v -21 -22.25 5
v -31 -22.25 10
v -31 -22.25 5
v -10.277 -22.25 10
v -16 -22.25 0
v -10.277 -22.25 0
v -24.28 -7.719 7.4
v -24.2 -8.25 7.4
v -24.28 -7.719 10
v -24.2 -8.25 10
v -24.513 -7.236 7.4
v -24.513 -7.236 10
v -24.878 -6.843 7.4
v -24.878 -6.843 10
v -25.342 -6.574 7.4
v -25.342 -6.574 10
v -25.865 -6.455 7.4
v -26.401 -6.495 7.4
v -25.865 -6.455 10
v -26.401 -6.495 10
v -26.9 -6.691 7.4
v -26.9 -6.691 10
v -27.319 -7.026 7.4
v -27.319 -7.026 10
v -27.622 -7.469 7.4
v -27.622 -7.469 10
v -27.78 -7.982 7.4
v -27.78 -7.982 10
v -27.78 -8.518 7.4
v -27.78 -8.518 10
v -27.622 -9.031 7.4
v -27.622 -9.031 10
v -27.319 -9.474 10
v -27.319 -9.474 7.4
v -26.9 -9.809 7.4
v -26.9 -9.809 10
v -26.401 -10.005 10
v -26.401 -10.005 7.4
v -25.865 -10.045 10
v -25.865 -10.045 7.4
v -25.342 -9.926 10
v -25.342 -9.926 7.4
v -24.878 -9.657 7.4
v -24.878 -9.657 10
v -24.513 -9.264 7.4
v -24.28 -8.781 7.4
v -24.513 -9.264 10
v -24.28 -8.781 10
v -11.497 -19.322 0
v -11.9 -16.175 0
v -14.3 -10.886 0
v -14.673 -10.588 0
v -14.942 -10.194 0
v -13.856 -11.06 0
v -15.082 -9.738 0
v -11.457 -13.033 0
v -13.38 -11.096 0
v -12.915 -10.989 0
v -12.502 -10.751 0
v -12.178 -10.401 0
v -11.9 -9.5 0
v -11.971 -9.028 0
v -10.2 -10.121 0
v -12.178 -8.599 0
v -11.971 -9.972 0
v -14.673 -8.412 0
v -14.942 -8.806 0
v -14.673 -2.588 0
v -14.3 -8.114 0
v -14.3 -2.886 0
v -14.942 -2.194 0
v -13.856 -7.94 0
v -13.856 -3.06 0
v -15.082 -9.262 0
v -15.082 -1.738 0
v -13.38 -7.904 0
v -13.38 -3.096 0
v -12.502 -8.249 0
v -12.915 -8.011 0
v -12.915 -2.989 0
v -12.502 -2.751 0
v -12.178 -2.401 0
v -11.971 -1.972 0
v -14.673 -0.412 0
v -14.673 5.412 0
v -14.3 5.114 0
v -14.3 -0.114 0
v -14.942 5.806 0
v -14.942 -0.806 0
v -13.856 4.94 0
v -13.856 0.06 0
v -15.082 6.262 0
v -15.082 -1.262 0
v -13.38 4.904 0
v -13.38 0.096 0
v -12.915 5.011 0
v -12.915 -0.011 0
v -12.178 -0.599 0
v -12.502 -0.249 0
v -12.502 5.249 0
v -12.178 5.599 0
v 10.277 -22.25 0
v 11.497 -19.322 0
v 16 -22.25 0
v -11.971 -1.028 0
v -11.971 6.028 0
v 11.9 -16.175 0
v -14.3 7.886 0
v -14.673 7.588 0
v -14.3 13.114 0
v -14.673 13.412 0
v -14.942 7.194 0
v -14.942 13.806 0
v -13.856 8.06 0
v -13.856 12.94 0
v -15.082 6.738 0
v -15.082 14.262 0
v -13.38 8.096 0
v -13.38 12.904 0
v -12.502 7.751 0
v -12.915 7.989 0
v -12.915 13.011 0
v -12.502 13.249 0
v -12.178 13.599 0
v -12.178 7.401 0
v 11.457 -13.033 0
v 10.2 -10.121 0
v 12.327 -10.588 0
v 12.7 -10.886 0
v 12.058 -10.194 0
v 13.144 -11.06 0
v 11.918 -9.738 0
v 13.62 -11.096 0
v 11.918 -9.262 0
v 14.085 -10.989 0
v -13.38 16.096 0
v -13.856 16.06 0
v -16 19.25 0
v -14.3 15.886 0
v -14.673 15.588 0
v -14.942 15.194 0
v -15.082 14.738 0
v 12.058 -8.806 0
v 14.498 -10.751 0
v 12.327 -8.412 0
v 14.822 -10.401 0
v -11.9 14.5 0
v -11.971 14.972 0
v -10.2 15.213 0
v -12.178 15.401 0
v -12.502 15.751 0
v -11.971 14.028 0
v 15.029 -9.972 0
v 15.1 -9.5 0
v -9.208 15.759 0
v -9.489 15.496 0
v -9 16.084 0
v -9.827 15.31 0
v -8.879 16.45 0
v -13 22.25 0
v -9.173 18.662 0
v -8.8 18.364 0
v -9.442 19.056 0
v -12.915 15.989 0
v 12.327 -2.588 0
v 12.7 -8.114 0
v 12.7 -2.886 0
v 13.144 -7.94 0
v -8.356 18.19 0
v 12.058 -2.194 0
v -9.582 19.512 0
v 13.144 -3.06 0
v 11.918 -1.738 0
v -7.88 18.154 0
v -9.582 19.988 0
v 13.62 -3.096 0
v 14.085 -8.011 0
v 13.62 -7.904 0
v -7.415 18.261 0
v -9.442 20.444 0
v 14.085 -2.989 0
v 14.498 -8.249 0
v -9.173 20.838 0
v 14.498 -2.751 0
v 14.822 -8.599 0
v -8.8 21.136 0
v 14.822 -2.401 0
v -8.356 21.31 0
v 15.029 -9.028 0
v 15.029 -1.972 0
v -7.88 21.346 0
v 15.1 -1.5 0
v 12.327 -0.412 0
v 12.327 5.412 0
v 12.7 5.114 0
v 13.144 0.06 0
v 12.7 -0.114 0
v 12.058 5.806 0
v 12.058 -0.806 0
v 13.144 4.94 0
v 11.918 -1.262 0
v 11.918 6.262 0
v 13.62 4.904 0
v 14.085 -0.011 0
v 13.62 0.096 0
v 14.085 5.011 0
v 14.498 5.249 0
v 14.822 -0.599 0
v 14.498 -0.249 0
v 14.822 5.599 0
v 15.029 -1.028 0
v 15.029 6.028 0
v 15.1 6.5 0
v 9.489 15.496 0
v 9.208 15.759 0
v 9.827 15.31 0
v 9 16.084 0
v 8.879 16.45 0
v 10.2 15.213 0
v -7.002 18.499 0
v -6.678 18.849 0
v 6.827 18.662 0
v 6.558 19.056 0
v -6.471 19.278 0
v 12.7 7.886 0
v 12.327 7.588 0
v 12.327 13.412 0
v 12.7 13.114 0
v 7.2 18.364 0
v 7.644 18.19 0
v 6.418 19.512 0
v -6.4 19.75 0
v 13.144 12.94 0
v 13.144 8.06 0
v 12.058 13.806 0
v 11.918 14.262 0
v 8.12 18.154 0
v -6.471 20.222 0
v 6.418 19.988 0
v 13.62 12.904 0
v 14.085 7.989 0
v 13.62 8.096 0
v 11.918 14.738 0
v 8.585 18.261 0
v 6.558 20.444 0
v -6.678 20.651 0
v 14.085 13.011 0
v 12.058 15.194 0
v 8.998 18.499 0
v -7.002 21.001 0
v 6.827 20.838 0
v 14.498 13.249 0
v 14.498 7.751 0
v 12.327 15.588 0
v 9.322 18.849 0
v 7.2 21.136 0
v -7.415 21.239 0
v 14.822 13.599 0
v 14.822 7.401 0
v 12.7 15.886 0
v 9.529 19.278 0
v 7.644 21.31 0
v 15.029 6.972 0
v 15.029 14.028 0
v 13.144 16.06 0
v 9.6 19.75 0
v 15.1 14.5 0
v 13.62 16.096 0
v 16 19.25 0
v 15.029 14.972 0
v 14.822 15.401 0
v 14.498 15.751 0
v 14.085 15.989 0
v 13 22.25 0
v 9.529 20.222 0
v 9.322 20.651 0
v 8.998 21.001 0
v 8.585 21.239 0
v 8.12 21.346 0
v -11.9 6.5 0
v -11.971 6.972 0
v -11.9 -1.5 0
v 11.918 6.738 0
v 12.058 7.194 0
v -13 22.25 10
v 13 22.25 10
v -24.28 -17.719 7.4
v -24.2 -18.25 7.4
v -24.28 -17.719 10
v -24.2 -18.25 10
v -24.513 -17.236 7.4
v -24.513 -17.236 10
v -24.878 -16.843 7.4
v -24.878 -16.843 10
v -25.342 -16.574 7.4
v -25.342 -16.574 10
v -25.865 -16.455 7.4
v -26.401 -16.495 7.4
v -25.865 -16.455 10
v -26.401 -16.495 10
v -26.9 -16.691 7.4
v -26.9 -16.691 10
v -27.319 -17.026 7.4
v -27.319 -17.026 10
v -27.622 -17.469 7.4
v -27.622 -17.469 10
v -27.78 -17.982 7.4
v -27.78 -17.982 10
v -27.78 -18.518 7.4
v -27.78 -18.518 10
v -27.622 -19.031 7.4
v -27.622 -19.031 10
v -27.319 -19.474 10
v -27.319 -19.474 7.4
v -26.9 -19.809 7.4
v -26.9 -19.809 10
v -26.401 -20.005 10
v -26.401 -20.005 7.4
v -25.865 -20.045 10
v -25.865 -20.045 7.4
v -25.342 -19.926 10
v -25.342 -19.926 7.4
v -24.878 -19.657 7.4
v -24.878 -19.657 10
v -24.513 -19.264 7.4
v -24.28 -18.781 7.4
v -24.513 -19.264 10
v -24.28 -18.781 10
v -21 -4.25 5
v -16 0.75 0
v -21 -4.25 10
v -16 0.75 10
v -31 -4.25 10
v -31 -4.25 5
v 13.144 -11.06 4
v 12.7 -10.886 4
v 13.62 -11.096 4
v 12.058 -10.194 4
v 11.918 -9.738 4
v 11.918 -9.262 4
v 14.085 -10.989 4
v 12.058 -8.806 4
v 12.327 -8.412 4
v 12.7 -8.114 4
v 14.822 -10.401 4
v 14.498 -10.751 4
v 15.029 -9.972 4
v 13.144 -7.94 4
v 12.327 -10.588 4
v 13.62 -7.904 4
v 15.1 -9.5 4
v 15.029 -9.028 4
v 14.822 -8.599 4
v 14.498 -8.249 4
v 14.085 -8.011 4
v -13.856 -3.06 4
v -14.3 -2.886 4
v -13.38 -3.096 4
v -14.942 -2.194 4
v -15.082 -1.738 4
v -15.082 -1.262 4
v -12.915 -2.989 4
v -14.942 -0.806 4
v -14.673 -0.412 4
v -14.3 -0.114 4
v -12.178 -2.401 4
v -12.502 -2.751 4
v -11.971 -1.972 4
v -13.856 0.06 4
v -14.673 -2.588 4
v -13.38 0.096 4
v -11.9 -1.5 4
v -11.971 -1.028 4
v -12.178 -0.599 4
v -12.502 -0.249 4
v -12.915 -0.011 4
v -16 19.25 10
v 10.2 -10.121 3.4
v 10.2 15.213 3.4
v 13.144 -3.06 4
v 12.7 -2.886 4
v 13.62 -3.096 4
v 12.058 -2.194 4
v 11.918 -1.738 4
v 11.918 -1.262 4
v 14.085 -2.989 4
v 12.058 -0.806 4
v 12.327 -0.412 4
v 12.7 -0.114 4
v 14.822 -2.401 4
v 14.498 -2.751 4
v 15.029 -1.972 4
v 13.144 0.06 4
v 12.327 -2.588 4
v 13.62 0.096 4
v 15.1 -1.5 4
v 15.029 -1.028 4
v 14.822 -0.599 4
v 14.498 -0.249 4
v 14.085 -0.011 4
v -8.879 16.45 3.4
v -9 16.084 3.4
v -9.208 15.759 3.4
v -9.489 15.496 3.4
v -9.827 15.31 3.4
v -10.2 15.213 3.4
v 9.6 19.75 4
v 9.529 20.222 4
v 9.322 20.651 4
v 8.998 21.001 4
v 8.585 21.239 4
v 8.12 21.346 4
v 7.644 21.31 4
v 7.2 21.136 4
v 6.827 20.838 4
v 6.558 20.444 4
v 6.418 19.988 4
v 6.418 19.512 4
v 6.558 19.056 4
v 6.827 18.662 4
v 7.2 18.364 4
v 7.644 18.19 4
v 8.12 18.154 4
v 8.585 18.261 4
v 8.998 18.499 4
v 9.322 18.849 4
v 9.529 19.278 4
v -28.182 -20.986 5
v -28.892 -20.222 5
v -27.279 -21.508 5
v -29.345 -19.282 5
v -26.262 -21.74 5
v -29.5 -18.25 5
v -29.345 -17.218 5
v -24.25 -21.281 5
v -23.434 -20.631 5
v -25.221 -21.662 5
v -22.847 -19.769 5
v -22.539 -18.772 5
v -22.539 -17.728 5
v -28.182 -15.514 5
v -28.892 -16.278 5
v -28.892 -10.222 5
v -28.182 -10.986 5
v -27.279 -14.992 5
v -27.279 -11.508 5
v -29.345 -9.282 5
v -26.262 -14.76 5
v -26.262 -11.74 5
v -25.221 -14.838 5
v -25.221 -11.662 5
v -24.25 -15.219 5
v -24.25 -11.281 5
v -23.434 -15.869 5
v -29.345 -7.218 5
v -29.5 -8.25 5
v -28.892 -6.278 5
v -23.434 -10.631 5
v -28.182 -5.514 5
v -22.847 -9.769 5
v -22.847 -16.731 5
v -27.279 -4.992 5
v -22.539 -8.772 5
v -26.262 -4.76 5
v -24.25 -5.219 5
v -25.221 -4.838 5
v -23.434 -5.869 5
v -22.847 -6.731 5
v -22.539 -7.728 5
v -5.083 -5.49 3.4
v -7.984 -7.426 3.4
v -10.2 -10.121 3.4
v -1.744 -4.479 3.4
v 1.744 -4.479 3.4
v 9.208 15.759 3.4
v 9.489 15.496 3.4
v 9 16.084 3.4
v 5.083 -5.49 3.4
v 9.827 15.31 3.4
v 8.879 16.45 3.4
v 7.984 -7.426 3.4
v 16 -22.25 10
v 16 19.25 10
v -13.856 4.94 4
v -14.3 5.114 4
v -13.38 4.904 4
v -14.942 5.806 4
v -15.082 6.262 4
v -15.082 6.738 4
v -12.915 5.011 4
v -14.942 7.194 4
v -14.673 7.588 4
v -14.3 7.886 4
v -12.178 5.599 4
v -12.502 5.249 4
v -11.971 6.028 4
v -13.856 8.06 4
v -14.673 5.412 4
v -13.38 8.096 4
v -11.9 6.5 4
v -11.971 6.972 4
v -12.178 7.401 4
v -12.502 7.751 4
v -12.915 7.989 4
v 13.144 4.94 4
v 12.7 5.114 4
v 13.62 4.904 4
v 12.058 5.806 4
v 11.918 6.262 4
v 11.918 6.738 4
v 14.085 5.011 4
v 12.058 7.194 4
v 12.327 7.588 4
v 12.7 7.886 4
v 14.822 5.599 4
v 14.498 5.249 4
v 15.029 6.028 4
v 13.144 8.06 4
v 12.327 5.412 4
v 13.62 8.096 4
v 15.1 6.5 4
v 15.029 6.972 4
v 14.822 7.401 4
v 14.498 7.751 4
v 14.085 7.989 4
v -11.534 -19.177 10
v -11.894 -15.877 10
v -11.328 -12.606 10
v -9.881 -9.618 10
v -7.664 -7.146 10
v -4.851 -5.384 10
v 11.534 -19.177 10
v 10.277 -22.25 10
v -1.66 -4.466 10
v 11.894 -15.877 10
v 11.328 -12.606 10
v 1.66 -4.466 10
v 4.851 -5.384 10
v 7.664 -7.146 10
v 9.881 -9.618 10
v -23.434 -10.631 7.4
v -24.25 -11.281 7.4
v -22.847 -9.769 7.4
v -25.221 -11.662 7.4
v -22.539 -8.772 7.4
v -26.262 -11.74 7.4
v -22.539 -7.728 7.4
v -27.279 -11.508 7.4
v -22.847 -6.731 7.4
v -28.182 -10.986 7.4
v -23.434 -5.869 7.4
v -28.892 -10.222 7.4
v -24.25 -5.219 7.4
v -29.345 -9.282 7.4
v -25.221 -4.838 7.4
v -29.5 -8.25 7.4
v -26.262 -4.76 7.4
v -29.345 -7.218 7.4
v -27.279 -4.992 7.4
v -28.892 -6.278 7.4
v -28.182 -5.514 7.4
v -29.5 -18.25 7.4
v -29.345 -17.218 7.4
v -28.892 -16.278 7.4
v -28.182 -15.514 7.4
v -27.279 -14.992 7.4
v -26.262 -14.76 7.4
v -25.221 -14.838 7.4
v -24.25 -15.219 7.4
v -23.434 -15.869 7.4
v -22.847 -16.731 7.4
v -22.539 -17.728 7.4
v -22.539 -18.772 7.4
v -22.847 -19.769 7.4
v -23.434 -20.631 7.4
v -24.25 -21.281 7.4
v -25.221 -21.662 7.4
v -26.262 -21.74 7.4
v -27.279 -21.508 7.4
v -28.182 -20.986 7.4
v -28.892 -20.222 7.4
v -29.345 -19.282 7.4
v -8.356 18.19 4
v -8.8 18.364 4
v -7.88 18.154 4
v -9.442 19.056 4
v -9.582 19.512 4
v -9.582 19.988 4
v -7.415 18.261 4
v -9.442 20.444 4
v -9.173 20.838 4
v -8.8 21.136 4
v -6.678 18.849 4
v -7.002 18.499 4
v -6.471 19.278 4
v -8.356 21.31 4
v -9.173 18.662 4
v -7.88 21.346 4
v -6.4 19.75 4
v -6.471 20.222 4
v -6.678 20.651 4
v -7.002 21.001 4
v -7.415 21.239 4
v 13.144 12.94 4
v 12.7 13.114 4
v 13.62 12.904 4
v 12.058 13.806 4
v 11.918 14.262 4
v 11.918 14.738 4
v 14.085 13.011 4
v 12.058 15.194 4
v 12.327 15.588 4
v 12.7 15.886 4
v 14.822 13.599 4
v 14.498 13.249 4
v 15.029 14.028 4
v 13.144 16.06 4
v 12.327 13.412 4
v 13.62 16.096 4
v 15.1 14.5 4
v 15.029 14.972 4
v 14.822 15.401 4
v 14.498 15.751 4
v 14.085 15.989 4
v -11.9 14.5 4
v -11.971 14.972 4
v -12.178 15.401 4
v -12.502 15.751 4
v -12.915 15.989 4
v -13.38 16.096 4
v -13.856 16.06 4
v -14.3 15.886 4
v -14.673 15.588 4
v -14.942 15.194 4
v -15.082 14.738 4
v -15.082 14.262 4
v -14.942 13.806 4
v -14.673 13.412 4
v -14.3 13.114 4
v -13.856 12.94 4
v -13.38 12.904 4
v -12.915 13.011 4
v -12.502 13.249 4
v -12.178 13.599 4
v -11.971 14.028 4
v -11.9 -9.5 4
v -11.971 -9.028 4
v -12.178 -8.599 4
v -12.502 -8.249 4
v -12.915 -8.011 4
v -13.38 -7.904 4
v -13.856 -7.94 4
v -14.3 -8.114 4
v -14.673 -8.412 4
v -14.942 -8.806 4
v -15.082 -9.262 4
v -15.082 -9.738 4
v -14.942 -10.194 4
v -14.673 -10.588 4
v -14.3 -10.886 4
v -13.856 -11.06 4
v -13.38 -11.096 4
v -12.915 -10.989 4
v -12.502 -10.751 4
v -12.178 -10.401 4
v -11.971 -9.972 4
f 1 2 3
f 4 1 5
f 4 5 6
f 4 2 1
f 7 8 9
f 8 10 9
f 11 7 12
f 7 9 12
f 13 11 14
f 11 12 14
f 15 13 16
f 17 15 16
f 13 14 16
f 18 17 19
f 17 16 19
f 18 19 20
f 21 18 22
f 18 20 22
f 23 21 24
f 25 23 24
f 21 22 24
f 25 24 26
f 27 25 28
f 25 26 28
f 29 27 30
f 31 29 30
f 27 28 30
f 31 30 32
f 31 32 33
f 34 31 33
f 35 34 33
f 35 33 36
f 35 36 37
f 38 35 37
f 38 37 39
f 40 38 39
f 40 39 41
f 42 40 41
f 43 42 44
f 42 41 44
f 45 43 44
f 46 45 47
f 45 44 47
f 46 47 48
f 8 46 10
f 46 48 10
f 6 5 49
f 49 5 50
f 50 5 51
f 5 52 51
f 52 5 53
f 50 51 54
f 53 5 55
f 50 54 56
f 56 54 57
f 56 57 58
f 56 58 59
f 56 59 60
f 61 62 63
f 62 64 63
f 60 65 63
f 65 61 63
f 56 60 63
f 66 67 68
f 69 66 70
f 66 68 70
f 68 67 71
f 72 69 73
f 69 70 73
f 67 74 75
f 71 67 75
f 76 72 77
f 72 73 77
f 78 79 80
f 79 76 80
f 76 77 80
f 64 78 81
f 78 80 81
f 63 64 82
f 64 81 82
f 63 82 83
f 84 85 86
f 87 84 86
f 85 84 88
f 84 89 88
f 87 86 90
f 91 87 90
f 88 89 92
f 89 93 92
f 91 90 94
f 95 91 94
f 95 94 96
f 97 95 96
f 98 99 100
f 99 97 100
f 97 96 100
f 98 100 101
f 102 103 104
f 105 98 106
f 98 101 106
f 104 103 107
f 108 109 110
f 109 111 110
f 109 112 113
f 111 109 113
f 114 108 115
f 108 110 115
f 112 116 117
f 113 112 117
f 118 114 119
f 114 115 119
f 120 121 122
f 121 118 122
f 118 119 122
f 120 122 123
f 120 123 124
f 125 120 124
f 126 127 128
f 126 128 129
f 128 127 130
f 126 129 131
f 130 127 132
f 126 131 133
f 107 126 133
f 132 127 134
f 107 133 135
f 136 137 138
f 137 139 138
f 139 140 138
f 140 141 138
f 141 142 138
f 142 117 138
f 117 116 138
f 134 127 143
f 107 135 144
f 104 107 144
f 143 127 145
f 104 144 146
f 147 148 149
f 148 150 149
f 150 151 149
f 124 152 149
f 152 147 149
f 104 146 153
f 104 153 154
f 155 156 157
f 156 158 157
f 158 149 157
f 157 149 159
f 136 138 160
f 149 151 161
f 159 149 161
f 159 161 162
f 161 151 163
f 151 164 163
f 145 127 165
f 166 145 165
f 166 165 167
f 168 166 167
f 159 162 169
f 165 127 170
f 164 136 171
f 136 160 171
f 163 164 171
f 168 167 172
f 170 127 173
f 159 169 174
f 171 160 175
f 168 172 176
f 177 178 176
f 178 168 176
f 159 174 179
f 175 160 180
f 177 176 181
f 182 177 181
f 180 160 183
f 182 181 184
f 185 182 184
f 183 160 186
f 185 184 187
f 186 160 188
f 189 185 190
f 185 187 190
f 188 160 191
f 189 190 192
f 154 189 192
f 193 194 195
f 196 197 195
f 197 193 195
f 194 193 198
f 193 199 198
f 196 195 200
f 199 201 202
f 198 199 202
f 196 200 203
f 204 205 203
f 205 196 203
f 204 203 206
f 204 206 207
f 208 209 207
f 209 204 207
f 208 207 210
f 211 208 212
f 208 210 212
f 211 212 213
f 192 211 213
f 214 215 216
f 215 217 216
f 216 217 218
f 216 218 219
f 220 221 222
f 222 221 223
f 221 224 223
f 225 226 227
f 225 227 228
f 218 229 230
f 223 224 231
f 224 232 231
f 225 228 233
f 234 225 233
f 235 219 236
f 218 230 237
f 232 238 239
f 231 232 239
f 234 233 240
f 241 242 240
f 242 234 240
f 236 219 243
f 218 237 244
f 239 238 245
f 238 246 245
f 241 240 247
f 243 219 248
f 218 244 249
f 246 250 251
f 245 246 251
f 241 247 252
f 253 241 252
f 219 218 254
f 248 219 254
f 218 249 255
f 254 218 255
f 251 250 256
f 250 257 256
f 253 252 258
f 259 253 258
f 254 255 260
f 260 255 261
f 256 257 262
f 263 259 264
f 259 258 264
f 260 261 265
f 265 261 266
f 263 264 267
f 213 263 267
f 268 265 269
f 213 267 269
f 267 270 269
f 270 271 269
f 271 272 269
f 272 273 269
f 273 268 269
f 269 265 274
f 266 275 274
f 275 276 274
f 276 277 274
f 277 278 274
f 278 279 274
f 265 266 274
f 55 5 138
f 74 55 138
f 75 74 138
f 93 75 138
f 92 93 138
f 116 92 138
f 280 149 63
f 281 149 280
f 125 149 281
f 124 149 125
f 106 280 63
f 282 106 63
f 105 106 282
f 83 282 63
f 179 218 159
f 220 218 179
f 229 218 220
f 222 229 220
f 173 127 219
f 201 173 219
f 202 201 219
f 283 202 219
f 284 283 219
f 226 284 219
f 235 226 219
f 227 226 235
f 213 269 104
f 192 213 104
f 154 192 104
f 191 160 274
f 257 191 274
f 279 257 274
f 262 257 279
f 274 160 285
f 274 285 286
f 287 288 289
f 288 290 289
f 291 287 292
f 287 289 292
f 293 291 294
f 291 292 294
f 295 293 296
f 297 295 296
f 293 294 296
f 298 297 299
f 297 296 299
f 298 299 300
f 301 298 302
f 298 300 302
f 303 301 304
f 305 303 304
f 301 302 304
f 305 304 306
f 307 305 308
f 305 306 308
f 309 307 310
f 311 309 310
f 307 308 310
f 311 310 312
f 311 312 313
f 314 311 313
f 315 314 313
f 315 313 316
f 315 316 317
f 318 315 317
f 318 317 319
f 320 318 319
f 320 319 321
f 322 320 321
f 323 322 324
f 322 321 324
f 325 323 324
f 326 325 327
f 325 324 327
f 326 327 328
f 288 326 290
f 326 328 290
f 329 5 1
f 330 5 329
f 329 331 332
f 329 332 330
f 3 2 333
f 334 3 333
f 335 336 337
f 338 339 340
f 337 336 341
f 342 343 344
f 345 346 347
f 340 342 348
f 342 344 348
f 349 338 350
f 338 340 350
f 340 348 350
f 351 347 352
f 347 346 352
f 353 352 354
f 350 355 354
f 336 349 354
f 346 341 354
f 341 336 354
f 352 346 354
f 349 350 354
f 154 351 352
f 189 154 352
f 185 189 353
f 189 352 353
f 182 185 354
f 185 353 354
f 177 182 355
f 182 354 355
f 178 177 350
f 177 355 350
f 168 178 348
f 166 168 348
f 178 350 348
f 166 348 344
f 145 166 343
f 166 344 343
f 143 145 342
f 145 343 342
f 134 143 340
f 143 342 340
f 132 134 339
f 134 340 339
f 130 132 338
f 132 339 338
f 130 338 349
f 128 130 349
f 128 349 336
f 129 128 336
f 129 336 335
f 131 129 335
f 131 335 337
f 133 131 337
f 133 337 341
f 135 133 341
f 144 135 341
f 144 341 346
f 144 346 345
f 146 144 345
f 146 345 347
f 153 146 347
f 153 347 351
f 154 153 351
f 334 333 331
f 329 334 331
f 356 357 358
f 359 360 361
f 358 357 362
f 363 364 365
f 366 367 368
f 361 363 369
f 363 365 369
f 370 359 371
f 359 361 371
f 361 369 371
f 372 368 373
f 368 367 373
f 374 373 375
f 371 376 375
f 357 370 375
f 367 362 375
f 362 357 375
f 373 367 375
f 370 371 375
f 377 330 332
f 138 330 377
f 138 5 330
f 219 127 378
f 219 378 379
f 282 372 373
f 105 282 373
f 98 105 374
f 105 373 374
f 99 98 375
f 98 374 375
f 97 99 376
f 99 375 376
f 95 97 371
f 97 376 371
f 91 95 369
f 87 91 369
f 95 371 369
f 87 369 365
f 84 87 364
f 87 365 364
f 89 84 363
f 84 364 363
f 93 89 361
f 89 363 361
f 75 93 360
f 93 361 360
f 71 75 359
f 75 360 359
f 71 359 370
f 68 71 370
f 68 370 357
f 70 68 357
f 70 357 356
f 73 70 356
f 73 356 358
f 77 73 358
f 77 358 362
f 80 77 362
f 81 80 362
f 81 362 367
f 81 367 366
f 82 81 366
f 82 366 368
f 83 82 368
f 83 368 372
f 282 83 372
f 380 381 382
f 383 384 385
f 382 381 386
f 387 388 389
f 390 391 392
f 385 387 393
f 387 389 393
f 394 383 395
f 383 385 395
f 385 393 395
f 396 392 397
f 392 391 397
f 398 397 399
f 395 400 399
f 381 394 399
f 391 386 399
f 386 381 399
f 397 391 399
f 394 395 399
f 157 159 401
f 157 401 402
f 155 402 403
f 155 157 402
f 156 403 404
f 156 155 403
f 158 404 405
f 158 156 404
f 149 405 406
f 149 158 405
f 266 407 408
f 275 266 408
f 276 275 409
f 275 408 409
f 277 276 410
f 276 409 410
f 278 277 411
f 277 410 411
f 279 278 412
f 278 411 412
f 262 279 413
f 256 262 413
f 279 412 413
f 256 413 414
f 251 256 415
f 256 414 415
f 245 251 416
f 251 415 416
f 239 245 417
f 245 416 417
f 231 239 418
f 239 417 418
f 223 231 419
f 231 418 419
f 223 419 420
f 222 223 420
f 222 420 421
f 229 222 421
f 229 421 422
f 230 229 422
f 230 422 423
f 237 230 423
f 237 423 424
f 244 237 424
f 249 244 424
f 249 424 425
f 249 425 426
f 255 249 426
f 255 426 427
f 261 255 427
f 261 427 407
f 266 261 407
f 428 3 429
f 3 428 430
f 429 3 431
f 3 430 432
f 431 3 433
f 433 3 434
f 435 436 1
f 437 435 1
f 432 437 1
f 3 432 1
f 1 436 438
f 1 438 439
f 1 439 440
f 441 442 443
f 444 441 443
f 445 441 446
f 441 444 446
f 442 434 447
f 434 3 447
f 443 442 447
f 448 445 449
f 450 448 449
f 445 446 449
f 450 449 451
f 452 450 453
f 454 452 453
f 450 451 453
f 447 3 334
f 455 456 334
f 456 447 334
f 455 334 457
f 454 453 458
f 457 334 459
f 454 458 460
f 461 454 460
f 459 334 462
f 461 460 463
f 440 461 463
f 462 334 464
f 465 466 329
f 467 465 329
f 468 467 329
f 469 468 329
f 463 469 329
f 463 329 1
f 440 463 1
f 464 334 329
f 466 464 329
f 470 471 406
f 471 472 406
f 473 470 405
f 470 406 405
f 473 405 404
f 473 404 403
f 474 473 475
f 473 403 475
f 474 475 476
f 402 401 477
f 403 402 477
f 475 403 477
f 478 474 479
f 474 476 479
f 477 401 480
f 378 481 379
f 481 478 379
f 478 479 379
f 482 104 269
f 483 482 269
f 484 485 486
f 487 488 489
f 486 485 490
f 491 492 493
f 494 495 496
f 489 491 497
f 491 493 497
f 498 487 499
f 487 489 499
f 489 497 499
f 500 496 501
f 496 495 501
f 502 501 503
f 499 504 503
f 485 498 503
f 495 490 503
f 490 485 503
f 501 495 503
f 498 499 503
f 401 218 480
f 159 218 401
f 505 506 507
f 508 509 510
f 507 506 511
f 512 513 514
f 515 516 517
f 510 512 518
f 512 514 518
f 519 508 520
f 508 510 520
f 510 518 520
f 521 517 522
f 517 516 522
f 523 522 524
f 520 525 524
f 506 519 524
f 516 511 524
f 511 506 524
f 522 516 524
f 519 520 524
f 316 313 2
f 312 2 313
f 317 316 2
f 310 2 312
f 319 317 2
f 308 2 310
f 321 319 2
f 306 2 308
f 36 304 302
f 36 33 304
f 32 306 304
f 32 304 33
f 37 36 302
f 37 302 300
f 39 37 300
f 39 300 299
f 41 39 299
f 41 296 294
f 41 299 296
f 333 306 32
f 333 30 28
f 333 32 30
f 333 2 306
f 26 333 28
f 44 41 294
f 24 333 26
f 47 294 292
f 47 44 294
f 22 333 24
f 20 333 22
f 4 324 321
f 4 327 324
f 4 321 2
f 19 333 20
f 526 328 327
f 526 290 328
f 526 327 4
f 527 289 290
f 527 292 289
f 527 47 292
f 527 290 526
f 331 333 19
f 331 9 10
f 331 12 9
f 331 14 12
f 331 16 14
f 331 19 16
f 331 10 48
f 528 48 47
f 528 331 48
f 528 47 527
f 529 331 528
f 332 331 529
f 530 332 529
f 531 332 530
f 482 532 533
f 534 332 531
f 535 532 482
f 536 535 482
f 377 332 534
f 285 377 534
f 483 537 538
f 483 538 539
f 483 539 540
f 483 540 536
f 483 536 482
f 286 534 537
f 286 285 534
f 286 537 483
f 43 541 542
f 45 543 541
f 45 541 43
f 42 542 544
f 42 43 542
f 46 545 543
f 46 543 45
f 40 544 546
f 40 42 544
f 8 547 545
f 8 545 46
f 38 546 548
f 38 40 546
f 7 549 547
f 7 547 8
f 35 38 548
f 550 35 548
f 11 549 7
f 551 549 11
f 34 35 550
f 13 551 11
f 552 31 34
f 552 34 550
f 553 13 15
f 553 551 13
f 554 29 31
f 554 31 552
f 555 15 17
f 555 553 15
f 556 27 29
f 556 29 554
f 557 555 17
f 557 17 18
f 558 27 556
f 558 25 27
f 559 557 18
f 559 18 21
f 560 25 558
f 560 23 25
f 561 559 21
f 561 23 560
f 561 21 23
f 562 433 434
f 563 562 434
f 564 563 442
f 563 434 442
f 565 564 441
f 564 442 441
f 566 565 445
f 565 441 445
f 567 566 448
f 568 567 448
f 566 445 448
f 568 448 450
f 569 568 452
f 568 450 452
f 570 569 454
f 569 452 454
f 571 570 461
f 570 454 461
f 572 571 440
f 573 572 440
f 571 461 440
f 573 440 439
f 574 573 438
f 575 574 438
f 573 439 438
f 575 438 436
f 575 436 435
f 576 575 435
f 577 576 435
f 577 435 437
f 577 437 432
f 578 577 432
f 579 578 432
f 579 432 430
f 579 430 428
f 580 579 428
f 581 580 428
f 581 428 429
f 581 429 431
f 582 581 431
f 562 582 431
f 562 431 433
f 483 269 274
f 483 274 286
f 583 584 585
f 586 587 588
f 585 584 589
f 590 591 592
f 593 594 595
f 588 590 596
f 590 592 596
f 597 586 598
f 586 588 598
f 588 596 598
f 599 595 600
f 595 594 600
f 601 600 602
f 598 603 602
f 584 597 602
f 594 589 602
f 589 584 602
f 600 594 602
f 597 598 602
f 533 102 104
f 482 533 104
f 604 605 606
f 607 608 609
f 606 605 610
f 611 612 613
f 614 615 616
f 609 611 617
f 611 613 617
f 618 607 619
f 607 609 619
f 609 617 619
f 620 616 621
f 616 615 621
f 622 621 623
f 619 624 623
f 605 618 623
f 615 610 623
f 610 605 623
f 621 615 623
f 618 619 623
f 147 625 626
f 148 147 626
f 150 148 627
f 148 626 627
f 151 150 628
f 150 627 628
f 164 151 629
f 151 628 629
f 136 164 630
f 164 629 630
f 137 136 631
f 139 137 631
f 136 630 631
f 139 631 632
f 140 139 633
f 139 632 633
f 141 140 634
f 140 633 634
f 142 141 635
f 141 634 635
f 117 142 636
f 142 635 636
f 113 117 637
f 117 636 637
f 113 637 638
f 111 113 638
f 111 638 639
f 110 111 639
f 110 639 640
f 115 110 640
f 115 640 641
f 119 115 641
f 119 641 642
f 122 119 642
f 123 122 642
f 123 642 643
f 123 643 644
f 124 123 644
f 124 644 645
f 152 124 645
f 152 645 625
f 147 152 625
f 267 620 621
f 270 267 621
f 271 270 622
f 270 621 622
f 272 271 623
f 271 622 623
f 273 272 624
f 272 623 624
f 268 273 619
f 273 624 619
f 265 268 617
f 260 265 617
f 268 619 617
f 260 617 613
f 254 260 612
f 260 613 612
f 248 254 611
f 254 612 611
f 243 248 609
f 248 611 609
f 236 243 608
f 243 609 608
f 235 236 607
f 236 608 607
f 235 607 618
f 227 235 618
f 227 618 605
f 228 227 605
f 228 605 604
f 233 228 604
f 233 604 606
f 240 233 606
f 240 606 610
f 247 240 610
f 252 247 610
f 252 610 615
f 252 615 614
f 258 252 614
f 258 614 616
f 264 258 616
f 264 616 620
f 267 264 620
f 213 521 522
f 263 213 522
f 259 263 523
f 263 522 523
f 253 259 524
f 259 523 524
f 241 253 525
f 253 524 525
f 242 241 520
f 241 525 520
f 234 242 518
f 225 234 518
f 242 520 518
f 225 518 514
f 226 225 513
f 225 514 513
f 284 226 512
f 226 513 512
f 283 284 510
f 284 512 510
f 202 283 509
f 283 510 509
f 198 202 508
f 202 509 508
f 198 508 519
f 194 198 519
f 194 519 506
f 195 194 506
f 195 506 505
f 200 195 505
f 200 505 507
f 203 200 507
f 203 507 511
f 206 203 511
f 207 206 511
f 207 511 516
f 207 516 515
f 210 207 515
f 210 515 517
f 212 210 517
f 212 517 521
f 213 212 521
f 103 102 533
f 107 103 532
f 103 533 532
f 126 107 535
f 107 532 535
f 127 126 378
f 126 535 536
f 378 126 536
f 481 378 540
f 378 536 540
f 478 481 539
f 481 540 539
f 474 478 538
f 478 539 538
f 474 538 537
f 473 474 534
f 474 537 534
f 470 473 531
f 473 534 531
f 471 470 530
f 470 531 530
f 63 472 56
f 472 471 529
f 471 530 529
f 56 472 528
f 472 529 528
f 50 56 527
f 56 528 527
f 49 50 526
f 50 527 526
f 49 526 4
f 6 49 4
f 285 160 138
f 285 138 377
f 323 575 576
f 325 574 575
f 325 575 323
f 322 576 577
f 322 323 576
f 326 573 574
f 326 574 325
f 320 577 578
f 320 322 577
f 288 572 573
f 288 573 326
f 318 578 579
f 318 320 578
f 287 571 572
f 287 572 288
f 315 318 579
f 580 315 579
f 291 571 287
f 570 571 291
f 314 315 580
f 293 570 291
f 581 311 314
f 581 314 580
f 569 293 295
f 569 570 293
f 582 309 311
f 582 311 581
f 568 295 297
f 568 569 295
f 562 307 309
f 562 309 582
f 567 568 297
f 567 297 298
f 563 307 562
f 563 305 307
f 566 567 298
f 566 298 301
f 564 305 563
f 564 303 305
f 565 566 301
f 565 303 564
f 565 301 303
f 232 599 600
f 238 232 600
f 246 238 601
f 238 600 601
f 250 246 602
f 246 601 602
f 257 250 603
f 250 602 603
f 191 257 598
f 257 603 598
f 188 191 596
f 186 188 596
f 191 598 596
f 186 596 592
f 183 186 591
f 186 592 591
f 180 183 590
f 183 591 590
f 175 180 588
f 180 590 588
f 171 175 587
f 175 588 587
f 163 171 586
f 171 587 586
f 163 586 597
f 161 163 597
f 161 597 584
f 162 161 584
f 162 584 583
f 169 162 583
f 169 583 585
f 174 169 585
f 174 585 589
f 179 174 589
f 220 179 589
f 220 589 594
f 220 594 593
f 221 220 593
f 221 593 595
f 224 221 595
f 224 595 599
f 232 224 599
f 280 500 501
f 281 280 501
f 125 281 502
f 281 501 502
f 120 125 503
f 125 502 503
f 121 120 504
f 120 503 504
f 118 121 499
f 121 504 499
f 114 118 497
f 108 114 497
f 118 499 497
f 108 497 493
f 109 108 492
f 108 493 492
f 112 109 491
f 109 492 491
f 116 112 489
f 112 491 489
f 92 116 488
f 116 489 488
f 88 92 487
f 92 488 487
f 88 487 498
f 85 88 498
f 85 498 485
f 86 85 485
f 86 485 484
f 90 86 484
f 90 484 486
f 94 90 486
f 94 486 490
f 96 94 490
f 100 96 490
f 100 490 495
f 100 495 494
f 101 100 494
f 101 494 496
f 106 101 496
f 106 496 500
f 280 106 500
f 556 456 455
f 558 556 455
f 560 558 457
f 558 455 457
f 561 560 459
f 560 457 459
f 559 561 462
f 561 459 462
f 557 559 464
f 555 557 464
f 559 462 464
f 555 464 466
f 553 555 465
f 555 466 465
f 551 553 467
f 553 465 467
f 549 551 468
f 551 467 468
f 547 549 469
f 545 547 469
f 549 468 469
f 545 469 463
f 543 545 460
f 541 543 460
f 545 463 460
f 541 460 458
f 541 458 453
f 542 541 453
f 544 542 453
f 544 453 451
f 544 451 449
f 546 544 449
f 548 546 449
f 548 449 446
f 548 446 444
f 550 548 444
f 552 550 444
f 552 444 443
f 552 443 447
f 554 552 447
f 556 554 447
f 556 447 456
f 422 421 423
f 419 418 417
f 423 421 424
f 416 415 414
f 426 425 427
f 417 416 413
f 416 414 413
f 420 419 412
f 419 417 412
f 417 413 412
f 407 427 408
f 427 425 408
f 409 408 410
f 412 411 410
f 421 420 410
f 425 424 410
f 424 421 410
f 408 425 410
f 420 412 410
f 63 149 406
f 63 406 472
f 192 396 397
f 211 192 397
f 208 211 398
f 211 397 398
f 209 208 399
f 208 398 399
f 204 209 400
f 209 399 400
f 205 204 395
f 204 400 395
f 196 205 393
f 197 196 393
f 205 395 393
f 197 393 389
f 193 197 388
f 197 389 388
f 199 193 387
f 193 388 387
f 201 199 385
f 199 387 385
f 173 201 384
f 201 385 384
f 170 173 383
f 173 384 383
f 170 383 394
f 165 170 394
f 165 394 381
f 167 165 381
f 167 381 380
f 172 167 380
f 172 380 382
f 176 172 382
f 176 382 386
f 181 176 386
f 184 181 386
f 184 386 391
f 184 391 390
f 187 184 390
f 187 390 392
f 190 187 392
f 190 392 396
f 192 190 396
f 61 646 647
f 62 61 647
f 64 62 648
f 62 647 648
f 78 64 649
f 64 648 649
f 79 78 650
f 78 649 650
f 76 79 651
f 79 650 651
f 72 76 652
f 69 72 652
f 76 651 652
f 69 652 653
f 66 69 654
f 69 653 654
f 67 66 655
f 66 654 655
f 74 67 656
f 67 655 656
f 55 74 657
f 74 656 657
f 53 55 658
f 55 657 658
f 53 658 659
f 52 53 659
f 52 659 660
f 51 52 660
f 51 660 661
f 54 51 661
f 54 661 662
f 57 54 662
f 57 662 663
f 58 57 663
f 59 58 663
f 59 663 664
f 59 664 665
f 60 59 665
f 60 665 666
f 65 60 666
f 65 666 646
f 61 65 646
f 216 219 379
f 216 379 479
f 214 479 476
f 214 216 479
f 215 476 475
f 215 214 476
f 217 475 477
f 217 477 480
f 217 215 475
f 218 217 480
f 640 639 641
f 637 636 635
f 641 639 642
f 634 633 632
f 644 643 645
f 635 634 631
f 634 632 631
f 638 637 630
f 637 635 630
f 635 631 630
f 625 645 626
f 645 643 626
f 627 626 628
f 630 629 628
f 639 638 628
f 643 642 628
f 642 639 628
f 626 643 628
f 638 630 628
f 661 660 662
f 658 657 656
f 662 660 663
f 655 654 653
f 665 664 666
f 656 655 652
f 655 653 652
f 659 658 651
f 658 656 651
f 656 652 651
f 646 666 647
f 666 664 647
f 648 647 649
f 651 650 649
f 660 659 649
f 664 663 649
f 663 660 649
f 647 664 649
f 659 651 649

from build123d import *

# Parameters (mm, degrees)
SZKIC1_W                                          = 32
SZKIC1_H                                          = 44.5
DODANIE_WYCI_GNI_CIE1_DEPTH                       = 10
WYTNIJ_WYCI_GNI_CIE1_REACH                        = 31.173
SZKIC2_R                                          = 11.9
WYTNIJ_WYCI_GNI_CIE2_DEPTH                        = 3.4
OTW_R_3_2_3_2_1_D                                 = 3.2
OTW_R_3_2_3_2_1_DEPTH                             = 4
SZKIC7_W                                          = 15
SZKIC7_H                                          = 18
DODANIE_WYCI_GNI_CIE2_DEPTH                       = 5
SFAZOWANIE1_SIZE                                  = 5
SFAZOWANIE2_SIZE                                  = 3
POG_BIENIE_WALCOWE_POD_M3_RUB_Z_BEM_S_D           = 3.6
POG_BIENIE_WALCOWE_POD_M3_RUB_Z_BEM_S_DEPTH       = 24
POG_BIENIE_WALCOWE_POD_M3_RUB_Z_BEM_S_CBORE_D     = 7
POG_BIENIE_WALCOWE_POD_M3_RUB_Z_BEM_S_CBORE_DEPTH = 2.4
POG_BIENIE_WALCOWE_POD_M3_RUB_Z_BEM_S_TIP         = 1.081549114


with BuildPart() as part:
    # Szkic1 → Dodanie-wyciągnięcie1 (new body)
    with BuildSketch(Plane.XY):
        Rectangle(SZKIC1_W, SZKIC1_H)
    extrude(amount=DODANIE_WYCI_GNI_CIE1_DEPTH)

    # Szkic2 → Wytnij-wyciągnięcie1 (cut, up to next)
    with BuildSketch(Plane.XY.offset(10), mode=Mode.PRIVATE) as wytnij_wyci_gni_cie1_sk1:
        with Locations((0, -16.25)):
            Circle(SZKIC2_R)
    wytnij_wyci_gni_cie1_tool1 = extrude(wytnij_wyci_gni_cie1_sk1.sketch, amount=-WYTNIJ_WYCI_GNI_CIE1_REACH, mode=Mode.PRIVATE) & part.part
    add(wytnij_wyci_gni_cie1_tool1.solids().sort_by_distance((0, -16.25, 10))[0], mode=Mode.SUBTRACT)

    # Szkic3 → Wytnij-wyciągnięcie2 (cut)
    with BuildSketch(Plane.XY):
        with BuildLine():
            Line((10.2, -7.3), (10.2, 15.212957385))
            ThreePointArc((10.2, 15.212957385), (9.34039504, 15.618745241), (8.879309367, 16.45))
            Line((8.879309367, 16.45), (-8.879309367, 16.45))
            ThreePointArc((-8.879309367, 16.45), (-9.34039504, 15.618745241), (-10.2, 15.212957385))
            Line((-10.2, 15.212957385), (-10.2, -7.3))
            Line((-10.2, -7.3), (-10.2, -10.120562832))
            Line((-10.2, -10.120562832), (10.2, -10.120562832))
            Line((10.2, -10.120562832), (10.2, -7.3))
        make_face()
    extrude(amount=WYTNIJ_WYCI_GNI_CIE2_DEPTH, mode=Mode.SUBTRACT)

    # Otwór Ø3.2 (3.2)1
    with Locations(Plane(origin=(0, 0, 0), x_dir=(-1, 0, 0), z_dir=(0, 0, -1))):
        with Locations((8, 19.75), (13.5, 14.5), (13.5, 6.5), (13.5, -1.5), (13.5, -9.5), (-13.5, -9.5), (-13.5, -1.5), (-13.5, 6.5), (-13.5, 14.5), (-8, 19.75)):
            Hole(OTW_R_3_2_3_2_1_D / 2, depth=OTW_R_3_2_3_2_1_DEPTH)

    # Szkic7 → Dodanie-wyciągnięcie2 (add)
    with BuildSketch(Plane.XY.offset(10)):
        with Locations((-23.5, -13.25)):
            Rectangle(SZKIC7_W, SZKIC7_H)
    extrude(amount=-DODANIE_WYCI_GNI_CIE2_DEPTH)

    # Sfazowanie1
    sfazowanie1_edges = [part.edges().sort_by_distance(p)[0] for p in [
        (-16, -13.25, 5),
        (-16, -4.25, 7.5),
    ]]
    chamfer(sfazowanie1_edges, length=SFAZOWANIE1_SIZE - 0.0001)  # a hair under: the kernel refuses the full size

    # Sfazowanie2
    sfazowanie2_edges = [part.edges().sort_by_distance(p)[0] for p in [
        (-16, 22.25, 5),
        (16, 22.25, 5),
    ]]
    chamfer(sfazowanie2_edges, length=SFAZOWANIE2_SIZE)

    # Pogłębienie walcowe pod M3 Śrubę z łbem stożkowym ściętym1
    with Locations(Plane(origin=(0, 0, 5), x_dir=(-1, 0, 0), z_dir=(0, 0, -1))):
        with Locations((26, -18.25), (26, -8.25)):
            CounterBoreHole(POG_BIENIE_WALCOWE_POD_M3_RUB_Z_BEM_S_D / 2, POG_BIENIE_WALCOWE_POD_M3_RUB_Z_BEM_S_CBORE_D / 2, POG_BIENIE_WALCOWE_POD_M3_RUB_Z_BEM_S_CBORE_DEPTH, depth=POG_BIENIE_WALCOWE_POD_M3_RUB_Z_BEM_S_DEPTH)
            with Locations((0, 0, -(POG_BIENIE_WALCOWE_POD_M3_RUB_Z_BEM_S_DEPTH + POG_BIENIE_WALCOWE_POD_M3_RUB_Z_BEM_S_TIP / 2))):  # 118° drill point
                Cone(0, POG_BIENIE_WALCOWE_POD_M3_RUB_Z_BEM_S_D / 2, POG_BIENIE_WALCOWE_POD_M3_RUB_Z_BEM_S_TIP, mode=Mode.SUBTRACT)


solid = part.part
